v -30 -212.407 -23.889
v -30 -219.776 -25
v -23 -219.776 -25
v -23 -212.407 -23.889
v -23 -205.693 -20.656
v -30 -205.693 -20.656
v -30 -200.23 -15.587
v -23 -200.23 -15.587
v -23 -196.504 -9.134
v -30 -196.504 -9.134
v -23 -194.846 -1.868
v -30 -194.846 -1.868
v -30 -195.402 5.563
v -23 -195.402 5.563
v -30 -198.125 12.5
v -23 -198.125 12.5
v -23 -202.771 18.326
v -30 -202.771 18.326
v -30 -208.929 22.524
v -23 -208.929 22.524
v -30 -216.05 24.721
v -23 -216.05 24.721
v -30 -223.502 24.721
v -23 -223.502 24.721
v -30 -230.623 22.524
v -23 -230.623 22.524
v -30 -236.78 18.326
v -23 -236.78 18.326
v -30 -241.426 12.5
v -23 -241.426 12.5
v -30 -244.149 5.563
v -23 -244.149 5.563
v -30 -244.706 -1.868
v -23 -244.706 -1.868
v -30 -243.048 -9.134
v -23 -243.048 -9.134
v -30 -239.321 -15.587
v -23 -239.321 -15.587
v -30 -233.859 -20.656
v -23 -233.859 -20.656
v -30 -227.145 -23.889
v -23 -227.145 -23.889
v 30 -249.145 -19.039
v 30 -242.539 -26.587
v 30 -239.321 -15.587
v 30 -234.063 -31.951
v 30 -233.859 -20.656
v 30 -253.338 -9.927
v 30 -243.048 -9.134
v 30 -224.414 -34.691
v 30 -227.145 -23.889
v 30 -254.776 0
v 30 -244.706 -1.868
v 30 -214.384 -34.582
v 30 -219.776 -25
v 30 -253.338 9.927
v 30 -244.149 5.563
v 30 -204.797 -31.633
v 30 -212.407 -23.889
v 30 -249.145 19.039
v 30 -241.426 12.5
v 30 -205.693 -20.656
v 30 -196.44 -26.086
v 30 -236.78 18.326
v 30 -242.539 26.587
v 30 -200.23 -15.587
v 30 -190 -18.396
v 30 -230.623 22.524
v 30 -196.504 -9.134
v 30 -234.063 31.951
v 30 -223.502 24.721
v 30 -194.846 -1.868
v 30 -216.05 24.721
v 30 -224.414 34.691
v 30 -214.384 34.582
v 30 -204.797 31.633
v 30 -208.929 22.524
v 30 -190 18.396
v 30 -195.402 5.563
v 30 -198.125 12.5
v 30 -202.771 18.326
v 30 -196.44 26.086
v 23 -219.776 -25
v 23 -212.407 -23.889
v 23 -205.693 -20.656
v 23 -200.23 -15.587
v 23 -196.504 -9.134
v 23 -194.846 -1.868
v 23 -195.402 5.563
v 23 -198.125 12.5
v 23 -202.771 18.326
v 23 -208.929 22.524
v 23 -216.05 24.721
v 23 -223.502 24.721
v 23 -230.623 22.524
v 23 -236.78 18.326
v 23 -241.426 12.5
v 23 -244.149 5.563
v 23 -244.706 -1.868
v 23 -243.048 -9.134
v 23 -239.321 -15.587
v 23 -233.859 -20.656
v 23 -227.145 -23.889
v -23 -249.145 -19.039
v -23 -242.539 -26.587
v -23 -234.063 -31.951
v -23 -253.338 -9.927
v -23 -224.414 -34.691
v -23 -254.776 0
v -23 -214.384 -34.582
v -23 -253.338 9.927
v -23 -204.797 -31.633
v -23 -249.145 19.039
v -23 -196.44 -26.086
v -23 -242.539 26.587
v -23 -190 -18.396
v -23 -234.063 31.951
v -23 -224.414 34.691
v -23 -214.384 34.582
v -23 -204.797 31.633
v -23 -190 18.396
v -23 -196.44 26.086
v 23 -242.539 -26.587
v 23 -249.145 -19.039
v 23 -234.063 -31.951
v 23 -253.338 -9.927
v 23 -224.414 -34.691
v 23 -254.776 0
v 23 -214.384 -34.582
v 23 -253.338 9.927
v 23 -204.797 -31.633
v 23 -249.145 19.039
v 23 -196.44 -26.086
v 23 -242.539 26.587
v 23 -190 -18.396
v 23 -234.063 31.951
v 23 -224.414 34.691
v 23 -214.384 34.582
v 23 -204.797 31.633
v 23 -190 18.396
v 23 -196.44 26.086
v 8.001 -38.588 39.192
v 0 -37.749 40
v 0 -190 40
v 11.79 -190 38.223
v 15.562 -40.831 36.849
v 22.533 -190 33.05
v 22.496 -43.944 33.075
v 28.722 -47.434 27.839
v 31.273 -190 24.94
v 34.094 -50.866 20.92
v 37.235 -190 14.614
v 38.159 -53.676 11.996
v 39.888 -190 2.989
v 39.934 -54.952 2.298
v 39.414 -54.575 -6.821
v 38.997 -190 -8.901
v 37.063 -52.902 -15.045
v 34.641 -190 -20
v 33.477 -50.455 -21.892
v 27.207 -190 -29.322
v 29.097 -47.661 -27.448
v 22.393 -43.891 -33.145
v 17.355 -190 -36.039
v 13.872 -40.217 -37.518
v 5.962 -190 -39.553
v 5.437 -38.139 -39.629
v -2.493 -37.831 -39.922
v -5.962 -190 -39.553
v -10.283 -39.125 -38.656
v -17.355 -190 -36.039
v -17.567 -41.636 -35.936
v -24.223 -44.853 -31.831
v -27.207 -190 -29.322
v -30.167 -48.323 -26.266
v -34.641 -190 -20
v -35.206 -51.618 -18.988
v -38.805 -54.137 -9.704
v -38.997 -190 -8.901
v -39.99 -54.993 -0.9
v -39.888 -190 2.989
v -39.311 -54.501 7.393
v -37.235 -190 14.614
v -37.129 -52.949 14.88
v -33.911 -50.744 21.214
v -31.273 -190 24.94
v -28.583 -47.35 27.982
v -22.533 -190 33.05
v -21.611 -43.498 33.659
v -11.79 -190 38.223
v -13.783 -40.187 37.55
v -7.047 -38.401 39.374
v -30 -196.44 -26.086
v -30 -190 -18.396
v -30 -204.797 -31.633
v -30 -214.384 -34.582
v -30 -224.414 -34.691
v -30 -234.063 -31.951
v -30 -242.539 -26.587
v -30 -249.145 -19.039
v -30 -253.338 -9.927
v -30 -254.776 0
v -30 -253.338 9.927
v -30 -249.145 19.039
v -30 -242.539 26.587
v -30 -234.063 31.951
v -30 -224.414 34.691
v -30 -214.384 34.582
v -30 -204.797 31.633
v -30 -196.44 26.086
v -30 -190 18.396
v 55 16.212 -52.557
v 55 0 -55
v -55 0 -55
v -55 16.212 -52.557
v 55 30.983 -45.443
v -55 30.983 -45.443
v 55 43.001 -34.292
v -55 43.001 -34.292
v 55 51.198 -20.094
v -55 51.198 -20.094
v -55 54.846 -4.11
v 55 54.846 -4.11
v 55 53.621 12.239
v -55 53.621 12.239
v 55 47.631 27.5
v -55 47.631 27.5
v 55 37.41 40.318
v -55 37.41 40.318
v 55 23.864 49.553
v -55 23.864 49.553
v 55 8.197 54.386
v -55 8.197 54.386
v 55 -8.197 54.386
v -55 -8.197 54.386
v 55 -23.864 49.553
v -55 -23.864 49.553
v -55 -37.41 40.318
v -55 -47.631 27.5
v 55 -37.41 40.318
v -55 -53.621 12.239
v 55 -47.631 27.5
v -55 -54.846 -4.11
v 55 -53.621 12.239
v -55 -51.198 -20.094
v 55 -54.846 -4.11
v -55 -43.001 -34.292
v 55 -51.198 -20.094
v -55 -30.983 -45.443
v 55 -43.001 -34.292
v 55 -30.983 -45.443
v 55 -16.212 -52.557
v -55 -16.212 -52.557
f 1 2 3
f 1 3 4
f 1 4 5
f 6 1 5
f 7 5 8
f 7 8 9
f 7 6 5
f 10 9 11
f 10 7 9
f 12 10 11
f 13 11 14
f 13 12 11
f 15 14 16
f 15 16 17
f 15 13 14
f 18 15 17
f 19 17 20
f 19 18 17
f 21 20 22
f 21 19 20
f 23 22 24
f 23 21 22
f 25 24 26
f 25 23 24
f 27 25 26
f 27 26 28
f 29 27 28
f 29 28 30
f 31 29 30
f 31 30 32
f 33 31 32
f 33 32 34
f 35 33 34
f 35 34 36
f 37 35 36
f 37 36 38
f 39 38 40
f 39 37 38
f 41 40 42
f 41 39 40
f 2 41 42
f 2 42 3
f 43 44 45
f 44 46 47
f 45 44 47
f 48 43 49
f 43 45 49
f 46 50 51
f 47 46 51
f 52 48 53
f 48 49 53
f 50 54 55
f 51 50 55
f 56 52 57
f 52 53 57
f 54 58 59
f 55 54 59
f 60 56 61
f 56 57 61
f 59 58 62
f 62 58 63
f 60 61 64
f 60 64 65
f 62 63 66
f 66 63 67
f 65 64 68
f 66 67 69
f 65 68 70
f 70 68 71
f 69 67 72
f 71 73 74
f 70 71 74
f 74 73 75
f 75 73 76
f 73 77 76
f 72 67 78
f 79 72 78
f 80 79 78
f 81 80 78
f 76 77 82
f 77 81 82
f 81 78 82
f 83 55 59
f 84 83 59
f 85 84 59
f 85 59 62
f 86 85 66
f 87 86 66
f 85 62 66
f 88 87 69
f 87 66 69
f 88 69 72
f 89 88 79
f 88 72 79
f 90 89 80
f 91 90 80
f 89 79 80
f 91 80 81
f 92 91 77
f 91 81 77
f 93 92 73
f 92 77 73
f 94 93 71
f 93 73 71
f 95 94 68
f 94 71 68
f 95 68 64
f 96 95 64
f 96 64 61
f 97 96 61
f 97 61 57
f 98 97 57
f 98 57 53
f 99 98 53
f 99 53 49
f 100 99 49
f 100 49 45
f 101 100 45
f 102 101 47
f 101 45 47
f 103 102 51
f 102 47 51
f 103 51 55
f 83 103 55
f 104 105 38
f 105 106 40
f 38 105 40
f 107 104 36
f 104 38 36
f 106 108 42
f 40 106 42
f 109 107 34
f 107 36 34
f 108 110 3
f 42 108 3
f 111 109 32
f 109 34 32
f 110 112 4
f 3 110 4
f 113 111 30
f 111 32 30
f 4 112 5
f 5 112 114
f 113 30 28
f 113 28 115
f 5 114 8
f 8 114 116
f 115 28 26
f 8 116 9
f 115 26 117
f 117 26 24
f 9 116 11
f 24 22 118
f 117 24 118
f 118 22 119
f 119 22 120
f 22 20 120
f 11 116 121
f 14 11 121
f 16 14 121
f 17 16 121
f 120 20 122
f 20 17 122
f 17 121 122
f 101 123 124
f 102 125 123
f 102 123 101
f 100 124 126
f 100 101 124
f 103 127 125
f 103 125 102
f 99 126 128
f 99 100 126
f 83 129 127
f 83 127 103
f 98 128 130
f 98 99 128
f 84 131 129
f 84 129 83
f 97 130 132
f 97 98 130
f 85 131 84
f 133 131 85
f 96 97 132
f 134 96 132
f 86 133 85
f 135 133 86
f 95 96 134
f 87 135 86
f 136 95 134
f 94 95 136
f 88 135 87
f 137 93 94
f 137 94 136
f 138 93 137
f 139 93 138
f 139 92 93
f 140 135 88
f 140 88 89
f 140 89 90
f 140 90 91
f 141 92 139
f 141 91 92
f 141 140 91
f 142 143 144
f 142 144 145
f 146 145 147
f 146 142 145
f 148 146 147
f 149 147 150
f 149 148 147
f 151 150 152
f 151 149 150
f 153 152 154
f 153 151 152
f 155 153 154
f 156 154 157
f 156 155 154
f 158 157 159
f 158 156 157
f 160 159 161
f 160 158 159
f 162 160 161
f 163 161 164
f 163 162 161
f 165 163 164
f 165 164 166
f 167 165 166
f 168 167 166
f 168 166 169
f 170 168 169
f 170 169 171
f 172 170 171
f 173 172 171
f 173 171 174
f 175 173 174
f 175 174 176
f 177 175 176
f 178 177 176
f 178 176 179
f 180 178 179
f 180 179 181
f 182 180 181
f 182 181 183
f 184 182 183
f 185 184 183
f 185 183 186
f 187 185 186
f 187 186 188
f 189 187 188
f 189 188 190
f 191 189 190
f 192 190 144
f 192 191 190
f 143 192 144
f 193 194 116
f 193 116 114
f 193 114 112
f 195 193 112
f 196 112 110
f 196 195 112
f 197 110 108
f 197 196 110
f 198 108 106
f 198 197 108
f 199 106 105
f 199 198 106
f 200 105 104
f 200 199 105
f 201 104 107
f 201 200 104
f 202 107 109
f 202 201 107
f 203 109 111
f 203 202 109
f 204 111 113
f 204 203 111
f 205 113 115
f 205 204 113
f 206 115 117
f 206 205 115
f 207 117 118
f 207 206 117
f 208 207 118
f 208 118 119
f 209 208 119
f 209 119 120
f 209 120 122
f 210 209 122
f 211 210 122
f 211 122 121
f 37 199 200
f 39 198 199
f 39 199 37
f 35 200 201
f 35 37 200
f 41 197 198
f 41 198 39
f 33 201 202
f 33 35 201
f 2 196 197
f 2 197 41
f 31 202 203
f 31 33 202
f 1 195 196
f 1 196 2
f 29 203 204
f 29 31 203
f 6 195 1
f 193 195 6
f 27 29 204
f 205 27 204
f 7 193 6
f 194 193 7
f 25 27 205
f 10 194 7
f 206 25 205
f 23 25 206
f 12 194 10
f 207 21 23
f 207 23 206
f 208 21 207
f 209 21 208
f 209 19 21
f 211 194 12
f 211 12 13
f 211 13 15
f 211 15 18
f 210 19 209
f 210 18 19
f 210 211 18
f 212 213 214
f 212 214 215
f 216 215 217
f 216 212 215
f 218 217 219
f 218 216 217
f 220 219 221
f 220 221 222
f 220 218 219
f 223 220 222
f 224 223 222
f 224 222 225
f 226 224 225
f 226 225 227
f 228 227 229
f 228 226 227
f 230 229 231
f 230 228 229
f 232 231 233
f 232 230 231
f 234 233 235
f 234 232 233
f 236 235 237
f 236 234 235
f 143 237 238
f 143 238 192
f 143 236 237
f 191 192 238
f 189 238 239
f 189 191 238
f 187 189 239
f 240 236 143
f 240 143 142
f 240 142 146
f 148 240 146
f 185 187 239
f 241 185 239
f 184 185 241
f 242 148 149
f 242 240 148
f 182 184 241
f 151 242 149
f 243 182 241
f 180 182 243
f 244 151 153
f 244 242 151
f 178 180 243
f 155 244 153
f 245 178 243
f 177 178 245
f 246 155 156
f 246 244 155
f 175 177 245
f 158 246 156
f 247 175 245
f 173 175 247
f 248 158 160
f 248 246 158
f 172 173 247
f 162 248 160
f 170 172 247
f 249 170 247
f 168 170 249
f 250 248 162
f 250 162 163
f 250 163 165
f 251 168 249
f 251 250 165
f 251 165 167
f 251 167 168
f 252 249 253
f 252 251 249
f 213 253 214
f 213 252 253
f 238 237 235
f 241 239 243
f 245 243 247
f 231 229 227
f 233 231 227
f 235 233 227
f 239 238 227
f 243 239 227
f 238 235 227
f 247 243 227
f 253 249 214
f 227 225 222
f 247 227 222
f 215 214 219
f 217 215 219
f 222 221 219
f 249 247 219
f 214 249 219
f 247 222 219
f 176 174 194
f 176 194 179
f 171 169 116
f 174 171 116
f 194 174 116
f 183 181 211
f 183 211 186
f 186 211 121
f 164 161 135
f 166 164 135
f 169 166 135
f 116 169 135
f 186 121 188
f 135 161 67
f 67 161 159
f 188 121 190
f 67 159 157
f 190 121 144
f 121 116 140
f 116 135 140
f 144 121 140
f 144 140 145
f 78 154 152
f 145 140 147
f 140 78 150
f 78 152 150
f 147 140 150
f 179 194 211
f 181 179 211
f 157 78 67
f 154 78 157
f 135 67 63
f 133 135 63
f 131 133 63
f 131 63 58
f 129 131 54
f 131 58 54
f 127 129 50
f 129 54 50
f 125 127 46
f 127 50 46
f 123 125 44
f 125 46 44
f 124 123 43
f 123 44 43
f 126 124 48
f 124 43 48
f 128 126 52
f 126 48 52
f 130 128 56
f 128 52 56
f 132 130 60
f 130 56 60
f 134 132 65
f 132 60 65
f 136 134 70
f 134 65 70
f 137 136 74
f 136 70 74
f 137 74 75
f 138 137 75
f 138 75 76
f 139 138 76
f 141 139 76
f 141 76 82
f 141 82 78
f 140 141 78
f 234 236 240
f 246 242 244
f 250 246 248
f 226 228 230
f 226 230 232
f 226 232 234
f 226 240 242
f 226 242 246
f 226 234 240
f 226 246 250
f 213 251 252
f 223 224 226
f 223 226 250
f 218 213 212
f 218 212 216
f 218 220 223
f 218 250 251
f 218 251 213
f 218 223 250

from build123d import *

# Parameters (mm, degrees)
SKETCH2_R           = 40
BOSS_EXTRUDE2_DEPTH = 190
SKETCH3_R           = 55
BOSS_EXTRUDE3_DEPTH = 55
SKETCH4_R           = 25
BOSS_EXTRUDE4_DEPTH = 7


with BuildPart() as part:
    # Sketch2 → Boss-Extrude2 (new body)
    with BuildSketch(Plane(origin=(0, 0, 0), x_dir=(1, 0, 0), z_dir=(0, 1, 0))):
        Circle(SKETCH2_R)
    extrude(amount=-BOSS_EXTRUDE2_DEPTH)

    # Sketch3 → Boss-Extrude3 (add, symmetric)
    with BuildSketch(Plane(origin=(0, 0, 0), x_dir=(0, 0, -1), z_dir=(1, 0, 0))):
        Circle(SKETCH3_R)
    extrude(amount=BOSS_EXTRUDE3_DEPTH, both=True)

    # Sketch4 → Boss-Extrude4 (add)
    with BuildSketch(Plane(origin=(30, 0, 0), x_dir=(0, 0, -1), z_dir=(1, 0, 0))):
        with BuildLine():
            Line((-18.395893308, -190), (18.395893308, -190))
            ThreePointArc((18.395893308, -190), (0, -254.775679831), (-18.395893308, -190))
        make_face()
        with Locations((0, -219.775679831)):
            Circle(SKETCH4_R, mode=Mode.SUBTRACT)
    boss_extrude4 = extrude(amount=-BOSS_EXTRUDE4_DEPTH)

    # Mirror1: Boss-Extrude4 across plane
    add(boss_extrude4.mirror(Plane(origin=(0, 0, 0), x_dir=(0, 0, 1), z_dir=(1, 0, 0))))


solid = part.part
